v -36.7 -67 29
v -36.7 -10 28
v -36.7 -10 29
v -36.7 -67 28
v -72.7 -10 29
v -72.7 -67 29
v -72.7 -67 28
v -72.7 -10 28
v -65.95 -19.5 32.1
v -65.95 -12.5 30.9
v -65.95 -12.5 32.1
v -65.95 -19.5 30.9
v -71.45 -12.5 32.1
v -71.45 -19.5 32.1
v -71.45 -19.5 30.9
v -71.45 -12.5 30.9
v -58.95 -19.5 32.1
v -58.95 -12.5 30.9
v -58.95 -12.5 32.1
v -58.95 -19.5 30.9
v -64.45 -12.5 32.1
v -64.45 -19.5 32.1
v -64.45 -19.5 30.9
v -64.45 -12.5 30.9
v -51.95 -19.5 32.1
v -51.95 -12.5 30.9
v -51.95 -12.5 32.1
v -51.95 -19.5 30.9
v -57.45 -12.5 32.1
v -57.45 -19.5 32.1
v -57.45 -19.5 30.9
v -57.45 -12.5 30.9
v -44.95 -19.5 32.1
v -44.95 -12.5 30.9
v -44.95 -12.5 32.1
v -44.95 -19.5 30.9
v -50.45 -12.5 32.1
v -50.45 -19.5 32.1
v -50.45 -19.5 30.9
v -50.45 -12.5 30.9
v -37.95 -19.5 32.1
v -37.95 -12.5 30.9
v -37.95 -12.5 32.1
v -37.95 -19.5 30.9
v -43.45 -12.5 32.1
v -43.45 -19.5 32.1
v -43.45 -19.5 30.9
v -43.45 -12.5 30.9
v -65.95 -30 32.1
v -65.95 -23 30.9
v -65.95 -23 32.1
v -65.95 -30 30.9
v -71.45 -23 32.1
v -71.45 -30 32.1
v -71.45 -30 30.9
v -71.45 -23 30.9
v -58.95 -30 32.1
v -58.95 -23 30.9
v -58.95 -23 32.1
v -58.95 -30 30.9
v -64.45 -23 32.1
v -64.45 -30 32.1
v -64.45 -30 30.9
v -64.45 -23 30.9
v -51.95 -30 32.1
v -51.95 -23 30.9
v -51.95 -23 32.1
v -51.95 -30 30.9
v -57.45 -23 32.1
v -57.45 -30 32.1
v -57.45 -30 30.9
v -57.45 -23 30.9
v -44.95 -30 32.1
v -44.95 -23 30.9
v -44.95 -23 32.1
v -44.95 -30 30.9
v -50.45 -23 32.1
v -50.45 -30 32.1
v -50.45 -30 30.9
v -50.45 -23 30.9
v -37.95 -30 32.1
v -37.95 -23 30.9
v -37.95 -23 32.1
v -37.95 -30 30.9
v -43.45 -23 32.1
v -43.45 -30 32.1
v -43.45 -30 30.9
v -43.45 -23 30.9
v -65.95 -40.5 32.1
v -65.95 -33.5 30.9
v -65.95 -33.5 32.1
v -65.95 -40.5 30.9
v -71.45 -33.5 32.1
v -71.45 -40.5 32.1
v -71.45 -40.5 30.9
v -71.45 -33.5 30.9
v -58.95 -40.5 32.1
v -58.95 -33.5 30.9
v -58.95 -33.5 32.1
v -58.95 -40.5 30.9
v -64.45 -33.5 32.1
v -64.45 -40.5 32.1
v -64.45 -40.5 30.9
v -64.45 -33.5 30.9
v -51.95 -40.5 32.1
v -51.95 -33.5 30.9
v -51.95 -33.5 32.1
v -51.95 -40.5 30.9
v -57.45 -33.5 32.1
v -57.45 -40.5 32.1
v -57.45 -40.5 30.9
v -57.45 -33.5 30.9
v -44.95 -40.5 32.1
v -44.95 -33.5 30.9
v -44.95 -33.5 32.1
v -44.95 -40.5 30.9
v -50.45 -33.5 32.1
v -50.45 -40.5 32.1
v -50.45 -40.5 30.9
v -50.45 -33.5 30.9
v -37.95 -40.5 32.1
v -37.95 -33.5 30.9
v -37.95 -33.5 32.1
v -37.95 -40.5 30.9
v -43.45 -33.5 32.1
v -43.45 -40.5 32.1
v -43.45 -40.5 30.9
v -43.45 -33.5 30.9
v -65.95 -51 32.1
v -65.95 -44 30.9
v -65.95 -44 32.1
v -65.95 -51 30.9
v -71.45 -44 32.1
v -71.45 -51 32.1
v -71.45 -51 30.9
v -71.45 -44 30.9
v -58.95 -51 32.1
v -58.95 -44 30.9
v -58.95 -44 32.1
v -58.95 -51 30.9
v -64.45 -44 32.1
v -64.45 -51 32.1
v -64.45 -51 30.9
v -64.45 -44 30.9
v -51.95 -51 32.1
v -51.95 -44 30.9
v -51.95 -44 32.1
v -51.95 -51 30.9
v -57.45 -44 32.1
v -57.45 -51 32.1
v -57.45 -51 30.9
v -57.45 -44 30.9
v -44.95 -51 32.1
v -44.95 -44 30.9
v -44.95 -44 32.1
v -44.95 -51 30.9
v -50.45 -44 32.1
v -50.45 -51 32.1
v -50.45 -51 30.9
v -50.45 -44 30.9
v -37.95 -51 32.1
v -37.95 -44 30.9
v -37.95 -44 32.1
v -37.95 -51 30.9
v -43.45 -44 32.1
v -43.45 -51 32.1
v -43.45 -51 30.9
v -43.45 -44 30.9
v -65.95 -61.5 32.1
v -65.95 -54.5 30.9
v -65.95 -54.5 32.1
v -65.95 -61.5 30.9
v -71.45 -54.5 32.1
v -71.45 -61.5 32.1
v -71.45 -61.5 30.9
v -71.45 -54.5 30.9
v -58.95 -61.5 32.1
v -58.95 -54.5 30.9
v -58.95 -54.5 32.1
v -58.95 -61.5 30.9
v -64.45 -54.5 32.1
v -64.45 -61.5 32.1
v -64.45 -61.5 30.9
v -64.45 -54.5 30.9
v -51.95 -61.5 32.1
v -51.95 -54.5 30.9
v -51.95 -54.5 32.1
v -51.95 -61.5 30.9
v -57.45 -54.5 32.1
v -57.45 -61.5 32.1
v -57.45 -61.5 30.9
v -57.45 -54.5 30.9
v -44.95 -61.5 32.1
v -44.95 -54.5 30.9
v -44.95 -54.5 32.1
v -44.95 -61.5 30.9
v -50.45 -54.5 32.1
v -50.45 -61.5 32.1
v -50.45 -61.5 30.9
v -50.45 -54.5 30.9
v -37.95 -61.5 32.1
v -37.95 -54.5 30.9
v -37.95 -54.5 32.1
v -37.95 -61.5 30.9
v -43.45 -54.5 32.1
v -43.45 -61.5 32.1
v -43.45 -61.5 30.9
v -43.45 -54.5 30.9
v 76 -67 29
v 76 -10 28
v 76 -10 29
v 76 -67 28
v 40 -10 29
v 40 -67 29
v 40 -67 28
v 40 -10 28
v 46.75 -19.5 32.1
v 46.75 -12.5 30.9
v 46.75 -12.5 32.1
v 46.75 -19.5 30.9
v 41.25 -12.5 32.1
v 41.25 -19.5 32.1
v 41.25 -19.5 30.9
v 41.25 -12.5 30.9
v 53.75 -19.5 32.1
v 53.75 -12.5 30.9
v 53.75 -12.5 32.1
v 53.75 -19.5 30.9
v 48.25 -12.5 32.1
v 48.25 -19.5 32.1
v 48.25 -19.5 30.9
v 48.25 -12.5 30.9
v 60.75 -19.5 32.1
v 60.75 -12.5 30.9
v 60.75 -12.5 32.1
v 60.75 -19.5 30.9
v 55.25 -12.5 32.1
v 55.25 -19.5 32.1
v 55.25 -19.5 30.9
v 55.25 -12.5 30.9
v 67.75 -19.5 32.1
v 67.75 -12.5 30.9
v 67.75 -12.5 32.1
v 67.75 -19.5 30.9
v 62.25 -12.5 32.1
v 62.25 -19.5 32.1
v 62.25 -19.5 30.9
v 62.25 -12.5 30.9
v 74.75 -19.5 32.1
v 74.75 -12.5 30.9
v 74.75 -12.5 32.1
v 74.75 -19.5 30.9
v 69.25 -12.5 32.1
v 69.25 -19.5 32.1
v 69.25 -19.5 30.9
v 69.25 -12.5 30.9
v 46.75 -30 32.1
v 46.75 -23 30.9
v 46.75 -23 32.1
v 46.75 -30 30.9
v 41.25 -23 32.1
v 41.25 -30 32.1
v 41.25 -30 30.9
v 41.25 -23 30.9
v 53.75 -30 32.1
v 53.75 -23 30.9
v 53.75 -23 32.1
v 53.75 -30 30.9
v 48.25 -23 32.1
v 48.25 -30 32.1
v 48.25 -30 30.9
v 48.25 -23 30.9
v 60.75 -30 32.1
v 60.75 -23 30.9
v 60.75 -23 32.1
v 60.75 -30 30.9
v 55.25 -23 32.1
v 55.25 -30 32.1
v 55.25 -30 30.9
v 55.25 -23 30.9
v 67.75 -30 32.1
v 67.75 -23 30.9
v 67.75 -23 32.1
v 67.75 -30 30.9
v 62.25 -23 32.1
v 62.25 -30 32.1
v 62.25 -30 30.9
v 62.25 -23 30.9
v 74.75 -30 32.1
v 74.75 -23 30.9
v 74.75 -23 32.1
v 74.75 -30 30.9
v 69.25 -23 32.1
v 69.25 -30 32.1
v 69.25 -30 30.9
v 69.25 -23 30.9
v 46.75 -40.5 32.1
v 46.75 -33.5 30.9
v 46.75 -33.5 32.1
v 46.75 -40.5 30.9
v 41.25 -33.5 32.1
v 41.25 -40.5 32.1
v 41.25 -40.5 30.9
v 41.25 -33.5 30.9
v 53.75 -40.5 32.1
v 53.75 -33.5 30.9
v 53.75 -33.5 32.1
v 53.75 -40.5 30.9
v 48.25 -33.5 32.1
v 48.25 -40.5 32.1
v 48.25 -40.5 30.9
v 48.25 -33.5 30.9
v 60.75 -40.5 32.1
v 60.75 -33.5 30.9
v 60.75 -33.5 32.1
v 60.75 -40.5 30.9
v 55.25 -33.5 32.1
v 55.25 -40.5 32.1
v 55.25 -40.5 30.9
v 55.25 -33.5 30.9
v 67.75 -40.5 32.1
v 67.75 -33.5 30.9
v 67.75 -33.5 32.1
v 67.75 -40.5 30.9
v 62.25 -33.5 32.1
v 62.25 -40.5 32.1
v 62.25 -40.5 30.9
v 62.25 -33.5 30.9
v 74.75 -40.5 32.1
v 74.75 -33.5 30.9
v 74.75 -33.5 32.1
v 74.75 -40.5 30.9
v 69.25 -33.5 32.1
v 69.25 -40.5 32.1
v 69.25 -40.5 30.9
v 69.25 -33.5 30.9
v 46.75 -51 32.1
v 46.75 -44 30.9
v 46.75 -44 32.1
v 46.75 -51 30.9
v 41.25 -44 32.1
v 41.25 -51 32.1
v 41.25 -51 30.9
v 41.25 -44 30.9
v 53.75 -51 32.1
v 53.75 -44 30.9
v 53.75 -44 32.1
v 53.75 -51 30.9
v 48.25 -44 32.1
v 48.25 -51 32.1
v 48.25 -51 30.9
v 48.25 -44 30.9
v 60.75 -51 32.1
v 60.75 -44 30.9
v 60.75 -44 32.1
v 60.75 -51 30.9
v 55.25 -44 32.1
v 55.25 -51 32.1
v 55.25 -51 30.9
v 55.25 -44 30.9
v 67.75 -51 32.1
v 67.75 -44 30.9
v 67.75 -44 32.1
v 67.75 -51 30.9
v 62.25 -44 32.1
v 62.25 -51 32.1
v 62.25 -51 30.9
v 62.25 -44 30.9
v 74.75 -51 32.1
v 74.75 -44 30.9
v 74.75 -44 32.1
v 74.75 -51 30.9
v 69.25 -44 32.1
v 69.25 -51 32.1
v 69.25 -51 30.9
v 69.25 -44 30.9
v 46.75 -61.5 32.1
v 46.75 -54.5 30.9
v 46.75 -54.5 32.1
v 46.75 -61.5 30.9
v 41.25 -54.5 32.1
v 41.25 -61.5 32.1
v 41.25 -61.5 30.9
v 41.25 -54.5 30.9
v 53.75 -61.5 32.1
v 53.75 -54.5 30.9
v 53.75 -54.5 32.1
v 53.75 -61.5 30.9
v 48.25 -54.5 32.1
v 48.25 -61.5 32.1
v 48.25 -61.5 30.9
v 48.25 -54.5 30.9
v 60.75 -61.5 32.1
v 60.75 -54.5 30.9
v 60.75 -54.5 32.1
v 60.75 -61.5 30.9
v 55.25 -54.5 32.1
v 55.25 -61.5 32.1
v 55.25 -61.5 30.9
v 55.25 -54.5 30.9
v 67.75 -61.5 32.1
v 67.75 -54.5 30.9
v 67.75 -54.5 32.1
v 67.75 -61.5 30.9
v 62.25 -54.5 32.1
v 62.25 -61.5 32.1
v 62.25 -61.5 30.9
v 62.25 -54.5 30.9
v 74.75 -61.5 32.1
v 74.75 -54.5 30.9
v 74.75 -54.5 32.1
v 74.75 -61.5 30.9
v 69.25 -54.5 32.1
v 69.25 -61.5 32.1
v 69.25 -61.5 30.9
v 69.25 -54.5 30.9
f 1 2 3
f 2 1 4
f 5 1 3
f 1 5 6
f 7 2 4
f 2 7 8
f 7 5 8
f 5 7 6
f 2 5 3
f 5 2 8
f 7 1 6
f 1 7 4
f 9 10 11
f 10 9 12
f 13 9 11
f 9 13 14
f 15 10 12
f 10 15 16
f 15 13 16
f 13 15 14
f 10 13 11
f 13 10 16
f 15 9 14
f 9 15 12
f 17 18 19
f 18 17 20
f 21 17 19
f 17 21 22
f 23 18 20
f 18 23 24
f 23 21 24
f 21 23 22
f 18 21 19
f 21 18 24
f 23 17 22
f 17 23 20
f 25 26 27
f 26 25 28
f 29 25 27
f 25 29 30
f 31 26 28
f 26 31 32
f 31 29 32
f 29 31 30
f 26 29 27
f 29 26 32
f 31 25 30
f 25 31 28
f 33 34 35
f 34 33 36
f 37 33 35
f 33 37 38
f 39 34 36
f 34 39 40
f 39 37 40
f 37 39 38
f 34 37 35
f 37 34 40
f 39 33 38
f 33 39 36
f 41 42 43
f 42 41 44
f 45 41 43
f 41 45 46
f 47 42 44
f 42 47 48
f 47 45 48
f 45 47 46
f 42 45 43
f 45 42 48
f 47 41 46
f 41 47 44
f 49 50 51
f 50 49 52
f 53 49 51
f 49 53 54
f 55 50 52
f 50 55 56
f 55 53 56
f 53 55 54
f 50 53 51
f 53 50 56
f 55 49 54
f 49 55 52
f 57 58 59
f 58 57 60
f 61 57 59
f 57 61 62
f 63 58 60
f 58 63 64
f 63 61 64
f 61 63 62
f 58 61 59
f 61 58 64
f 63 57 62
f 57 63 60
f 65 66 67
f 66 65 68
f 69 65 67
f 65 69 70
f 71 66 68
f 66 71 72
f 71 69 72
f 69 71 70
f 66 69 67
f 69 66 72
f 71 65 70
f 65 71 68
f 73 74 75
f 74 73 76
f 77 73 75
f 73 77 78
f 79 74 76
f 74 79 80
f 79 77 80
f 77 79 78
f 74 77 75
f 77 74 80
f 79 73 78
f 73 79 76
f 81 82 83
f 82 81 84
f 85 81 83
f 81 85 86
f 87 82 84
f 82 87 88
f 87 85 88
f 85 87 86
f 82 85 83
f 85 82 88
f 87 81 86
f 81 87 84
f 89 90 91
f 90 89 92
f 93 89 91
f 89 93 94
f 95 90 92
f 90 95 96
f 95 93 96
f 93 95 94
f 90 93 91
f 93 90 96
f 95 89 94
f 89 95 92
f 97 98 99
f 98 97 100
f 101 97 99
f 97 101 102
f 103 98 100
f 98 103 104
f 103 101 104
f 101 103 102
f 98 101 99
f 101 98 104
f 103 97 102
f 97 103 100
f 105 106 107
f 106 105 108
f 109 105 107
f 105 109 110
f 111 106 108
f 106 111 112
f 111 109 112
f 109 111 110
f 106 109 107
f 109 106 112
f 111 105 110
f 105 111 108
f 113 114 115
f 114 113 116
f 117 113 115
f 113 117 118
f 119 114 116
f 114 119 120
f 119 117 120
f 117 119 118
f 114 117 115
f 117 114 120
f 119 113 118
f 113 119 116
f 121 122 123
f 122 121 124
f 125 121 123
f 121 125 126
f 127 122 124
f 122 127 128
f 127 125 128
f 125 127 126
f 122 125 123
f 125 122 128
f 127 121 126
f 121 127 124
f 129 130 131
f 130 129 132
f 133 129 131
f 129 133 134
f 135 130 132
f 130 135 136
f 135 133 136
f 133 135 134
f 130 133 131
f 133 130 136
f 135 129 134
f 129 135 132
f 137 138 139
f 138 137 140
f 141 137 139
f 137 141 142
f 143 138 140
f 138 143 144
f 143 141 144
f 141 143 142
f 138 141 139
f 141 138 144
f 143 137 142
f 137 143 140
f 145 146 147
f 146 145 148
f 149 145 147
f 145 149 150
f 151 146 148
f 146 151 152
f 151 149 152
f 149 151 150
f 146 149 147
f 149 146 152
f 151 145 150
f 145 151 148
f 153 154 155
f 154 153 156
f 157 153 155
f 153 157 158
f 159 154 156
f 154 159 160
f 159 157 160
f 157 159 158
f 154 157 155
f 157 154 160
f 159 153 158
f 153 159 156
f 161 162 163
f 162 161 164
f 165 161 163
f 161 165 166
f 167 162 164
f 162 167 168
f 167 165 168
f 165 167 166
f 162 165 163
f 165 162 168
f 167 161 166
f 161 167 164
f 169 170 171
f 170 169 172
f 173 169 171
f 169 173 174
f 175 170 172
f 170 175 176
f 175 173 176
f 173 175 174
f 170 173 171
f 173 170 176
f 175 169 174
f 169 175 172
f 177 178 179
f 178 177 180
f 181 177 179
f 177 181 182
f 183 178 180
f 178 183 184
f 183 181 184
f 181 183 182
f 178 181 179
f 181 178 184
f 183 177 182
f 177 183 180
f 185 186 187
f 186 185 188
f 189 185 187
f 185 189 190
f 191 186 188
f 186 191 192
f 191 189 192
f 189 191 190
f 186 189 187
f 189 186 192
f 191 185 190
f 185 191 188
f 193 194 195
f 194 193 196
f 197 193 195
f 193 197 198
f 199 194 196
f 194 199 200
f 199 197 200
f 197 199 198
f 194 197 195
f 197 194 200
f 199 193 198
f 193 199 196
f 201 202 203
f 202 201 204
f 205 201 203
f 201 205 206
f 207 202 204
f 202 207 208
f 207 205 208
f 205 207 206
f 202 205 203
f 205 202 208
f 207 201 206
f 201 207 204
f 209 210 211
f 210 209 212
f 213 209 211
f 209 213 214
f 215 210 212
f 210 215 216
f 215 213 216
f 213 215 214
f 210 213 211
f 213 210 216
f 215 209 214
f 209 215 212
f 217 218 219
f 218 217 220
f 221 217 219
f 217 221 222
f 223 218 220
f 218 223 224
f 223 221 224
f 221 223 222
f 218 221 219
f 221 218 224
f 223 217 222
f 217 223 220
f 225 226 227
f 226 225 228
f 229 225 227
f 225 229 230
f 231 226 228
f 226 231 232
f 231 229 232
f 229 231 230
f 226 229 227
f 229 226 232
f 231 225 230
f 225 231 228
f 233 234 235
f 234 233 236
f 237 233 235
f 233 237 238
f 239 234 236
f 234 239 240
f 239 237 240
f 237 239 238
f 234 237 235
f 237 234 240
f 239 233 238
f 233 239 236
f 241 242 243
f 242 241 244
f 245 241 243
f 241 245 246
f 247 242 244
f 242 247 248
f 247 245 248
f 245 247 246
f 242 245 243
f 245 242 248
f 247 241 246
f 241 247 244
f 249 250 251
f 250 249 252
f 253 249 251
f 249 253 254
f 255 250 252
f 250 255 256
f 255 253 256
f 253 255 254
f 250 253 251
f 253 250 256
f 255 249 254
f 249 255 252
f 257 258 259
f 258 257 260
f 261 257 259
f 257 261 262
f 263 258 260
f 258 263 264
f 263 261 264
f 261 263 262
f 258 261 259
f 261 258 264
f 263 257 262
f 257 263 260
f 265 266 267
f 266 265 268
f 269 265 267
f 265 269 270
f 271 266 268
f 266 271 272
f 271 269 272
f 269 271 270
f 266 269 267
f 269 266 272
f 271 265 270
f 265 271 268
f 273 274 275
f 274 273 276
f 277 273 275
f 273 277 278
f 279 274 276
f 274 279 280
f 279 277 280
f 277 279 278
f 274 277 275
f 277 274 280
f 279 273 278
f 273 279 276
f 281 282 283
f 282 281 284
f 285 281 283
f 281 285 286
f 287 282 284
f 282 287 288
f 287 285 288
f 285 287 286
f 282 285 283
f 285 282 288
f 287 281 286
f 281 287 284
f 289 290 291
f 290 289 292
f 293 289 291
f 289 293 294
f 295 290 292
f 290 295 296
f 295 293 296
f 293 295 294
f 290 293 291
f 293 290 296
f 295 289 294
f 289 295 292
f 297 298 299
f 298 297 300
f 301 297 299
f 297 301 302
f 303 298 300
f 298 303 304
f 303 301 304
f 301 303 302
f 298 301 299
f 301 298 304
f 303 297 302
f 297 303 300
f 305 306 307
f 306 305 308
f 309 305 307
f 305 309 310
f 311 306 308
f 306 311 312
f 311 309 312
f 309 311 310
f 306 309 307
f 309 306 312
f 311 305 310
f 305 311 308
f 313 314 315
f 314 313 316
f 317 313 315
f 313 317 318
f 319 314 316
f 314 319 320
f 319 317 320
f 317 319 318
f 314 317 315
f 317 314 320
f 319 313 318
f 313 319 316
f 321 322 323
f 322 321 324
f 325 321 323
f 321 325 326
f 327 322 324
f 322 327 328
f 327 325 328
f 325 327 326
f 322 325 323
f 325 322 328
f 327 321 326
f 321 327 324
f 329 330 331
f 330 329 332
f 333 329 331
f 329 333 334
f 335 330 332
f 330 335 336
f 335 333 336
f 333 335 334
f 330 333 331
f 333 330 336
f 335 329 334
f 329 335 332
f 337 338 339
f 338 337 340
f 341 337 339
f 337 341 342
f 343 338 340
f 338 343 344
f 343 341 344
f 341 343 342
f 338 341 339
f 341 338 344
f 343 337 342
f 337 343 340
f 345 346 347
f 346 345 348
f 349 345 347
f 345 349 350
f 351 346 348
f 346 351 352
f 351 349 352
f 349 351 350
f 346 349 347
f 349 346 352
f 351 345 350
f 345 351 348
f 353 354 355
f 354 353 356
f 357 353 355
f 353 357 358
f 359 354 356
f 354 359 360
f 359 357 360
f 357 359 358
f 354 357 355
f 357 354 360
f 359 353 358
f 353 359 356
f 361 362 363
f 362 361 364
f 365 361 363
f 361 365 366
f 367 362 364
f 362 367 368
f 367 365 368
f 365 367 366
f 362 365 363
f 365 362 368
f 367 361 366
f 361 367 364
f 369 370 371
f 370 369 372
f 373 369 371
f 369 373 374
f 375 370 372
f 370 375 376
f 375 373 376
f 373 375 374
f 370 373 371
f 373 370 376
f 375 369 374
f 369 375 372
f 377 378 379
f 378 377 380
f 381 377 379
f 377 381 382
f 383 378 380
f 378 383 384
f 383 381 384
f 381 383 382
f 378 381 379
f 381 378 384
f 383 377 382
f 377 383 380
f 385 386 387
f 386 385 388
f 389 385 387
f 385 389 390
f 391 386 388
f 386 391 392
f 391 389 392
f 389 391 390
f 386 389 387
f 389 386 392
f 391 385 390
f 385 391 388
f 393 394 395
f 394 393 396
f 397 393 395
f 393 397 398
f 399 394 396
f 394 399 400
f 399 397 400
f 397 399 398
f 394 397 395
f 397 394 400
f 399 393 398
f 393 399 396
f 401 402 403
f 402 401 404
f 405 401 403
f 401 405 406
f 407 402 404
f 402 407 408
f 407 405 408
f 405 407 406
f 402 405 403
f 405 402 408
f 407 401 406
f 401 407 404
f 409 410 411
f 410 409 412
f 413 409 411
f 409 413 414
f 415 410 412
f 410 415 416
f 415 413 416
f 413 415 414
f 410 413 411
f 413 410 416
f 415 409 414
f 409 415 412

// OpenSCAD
// Thor QWERTY retrofit conceptual solids, mm
// Source scan and exact inner housing *not* redistributed or certified.
// Two attachments are displayed OVER original control areas.
// This is not a cutting template or closed-lid clearance proof.
include_scan = false;
source_scan = "/tmp/hs-thor-open-reference-20261109.stl";
if (include_scan) color([0.55,0.55,0.58,0.4]) import(source_scan, convexity=3);
pcb_thickness = 1.0;  // exploratory, not KiCad stackup qualified
switch_height = 1.9; // C&K KMR2 spec over PCB
cap_extra_height = 1.2; // unverified cap geometry
module_z = 28.0; // placeholder: NOT qualified from internal scan
module_mounts_known = false;
module_lid_clearance_known = false;
// left: original controls should be removed, but mounts unproven
color([0.12,0.36,0.48,0.76]) translate([-72.7,-67.0,module_z]) cube([36.0,57.0,pcb_thickness]);
color([0.81,0.92,0.78]) translate([-71.450,-19.500,module_z+pcb_thickness+switch_height]) cube([5.5,7.0,cap_extra_height]); // Q
color([0.81,0.92,0.78]) translate([-64.450,-19.500,module_z+pcb_thickness+switch_height]) cube([5.5,7.0,cap_extra_height]); // W
color([0.81,0.92,0.78]) translate([-57.450,-19.500,module_z+pcb_thickness+switch_height]) cube([5.5,7.0,cap_extra_height]); // E
color([0.81,0.92,0.78]) translate([-50.450,-19.500,module_z+pcb_thickness+switch_height]) cube([5.5,7.0,cap_extra_height]); // R
color([0.81,0.92,0.78]) translate([-43.450,-19.500,module_z+pcb_thickness+switch_height]) cube([5.5,7.0,cap_extra_height]); // T
color([0.81,0.92,0.78]) translate([-71.450,-30.000,module_z+pcb_thickness+switch_height]) cube([5.5,7.0,cap_extra_height]); // A
color([0.81,0.92,0.78]) translate([-64.450,-30.000,module_z+pcb_thickness+switch_height]) cube([5.5,7.0,cap_extra_height]); // S
color([0.81,0.92,0.78]) translate([-57.450,-30.000,module_z+pcb_thickness+switch_height]) cube([5.5,7.0,cap_extra_height]); // D
color([0.81,0.92,0.78]) translate([-50.450,-30.000,module_z+pcb_thickness+switch_height]) cube([5.5,7.0,cap_extra_height]); // F
color([0.81,0.92,0.78]) translate([-43.450,-30.000,module_z+pcb_thickness+switch_height]) cube([5.5,7.0,cap_extra_height]); // G
color([0.81,0.92,0.78]) translate([-71.450,-40.500,module_z+pcb_thickness+switch_height]) cube([5.5,7.0,cap_extra_height]); // Z
color([0.81,0.92,0.78]) translate([-64.450,-40.500,module_z+pcb_thickness+switch_height]) cube([5.5,7.0,cap_extra_height]); // X
color([0.81,0.92,0.78]) translate([-57.450,-40.500,module_z+pcb_thickness+switch_height]) cube([5.5,7.0,cap_extra_height]); // C
color([0.81,0.92,0.78]) translate([-50.450,-40.500,module_z+pcb_thickness+switch_height]) cube([5.5,7.0,cap_extra_height]); // V
color([0.81,0.92,0.78]) translate([-43.450,-40.500,module_z+pcb_thickness+switch_height]) cube([5.5,7.0,cap_extra_height]); // B
color([0.81,0.92,0.78]) translate([-71.450,-51.000,module_z+pcb_thickness+switch_height]) cube([5.5,7.0,cap_extra_height]); // 1
color([0.81,0.92,0.78]) translate([-64.450,-51.000,module_z+pcb_thickness+switch_height]) cube([5.5,7.0,cap_extra_height]); // 2
color([0.81,0.92,0.78]) translate([-57.450,-51.000,module_z+pcb_thickness+switch_height]) cube([5.5,7.0,cap_extra_height]); // 3
color([0.81,0.92,0.78]) translate([-50.450,-51.000,module_z+pcb_thickness+switch_height]) cube([5.5,7.0,cap_extra_height]); // 4
color([0.81,0.92,0.78]) translate([-43.450,-51.000,module_z+pcb_thickness+switch_height]) cube([5.5,7.0,cap_extra_height]); // 5
color([0.81,0.92,0.78]) translate([-71.450,-61.500,module_z+pcb_thickness+switch_height]) cube([5.5,7.0,cap_extra_height]); // SHIFT
color([0.81,0.92,0.78]) translate([-64.450,-61.500,module_z+pcb_thickness+switch_height]) cube([5.5,7.0,cap_extra_height]); // CTRL
color([0.81,0.92,0.78]) translate([-57.450,-61.500,module_z+pcb_thickness+switch_height]) cube([5.5,7.0,cap_extra_height]); // ALT
color([0.81,0.92,0.78]) translate([-50.450,-61.500,module_z+pcb_thickness+switch_height]) cube([5.5,7.0,cap_extra_height]); // TAB
color([0.81,0.92,0.78]) translate([-43.450,-61.500,module_z+pcb_thickness+switch_height]) cube([5.5,7.0,cap_extra_height]); // FN
// right: original controls should be removed, but mounts unproven
color([0.12,0.36,0.48,0.76]) translate([40.0,-67.0,module_z]) cube([36.0,57.0,pcb_thickness]);
color([0.81,0.92,0.78]) translate([41.250,-19.500,module_z+pcb_thickness+switch_height]) cube([5.5,7.0,cap_extra_height]); // Y
color([0.81,0.92,0.78]) translate([48.250,-19.500,module_z+pcb_thickness+switch_height]) cube([5.5,7.0,cap_extra_height]); // U
color([0.81,0.92,0.78]) translate([55.250,-19.500,module_z+pcb_thickness+switch_height]) cube([5.5,7.0,cap_extra_height]); // I
color([0.81,0.92,0.78]) translate([62.250,-19.500,module_z+pcb_thickness+switch_height]) cube([5.5,7.0,cap_extra_height]); // O
color([0.81,0.92,0.78]) translate([69.250,-19.500,module_z+pcb_thickness+switch_height]) cube([5.5,7.0,cap_extra_height]); // P
color([0.81,0.92,0.78]) translate([41.250,-30.000,module_z+pcb_thickness+switch_height]) cube([5.5,7.0,cap_extra_height]); // H
color([0.81,0.92,0.78]) translate([48.250,-30.000,module_z+pcb_thickness+switch_height]) cube([5.5,7.0,cap_extra_height]); // J
color([0.81,0.92,0.78]) translate([55.250,-30.000,module_z+pcb_thickness+switch_height]) cube([5.5,7.0,cap_extra_height]); // K
color([0.81,0.92,0.78]) translate([62.250,-30.000,module_z+pcb_thickness+switch_height]) cube([5.5,7.0,cap_extra_height]); // L
color([0.81,0.92,0.78]) translate([69.250,-30.000,module_z+pcb_thickness+switch_height]) cube([5.5,7.0,cap_extra_height]); // ;
color([0.81,0.92,0.78]) translate([41.250,-40.500,module_z+pcb_thickness+switch_height]) cube([5.5,7.0,cap_extra_height]); // N
color([0.81,0.92,0.78]) translate([48.250,-40.500,module_z+pcb_thickness+switch_height]) cube([5.5,7.0,cap_extra_height]); // M
color([0.81,0.92,0.78]) translate([55.250,-40.500,module_z+pcb_thickness+switch_height]) cube([5.5,7.0,cap_extra_height]); // ,
color([0.81,0.92,0.78]) translate([62.250,-40.500,module_z+pcb_thickness+switch_height]) cube([5.5,7.0,cap_extra_height]); // .
color([0.81,0.92,0.78]) translate([69.250,-40.500,module_z+pcb_thickness+switch_height]) cube([5.5,7.0,cap_extra_height]); // /
color([0.81,0.92,0.78]) translate([41.250,-51.000,module_z+pcb_thickness+switch_height]) cube([5.5,7.0,cap_extra_height]); // 6
color([0.81,0.92,0.78]) translate([48.250,-51.000,module_z+pcb_thickness+switch_height]) cube([5.5,7.0,cap_extra_height]); // 7
color([0.81,0.92,0.78]) translate([55.250,-51.000,module_z+pcb_thickness+switch_height]) cube([5.5,7.0,cap_extra_height]); // 8
color([0.81,0.92,0.78]) translate([62.250,-51.000,module_z+pcb_thickness+switch_height]) cube([5.5,7.0,cap_extra_height]); // 9
color([0.81,0.92,0.78]) translate([69.250,-51.000,module_z+pcb_thickness+switch_height]) cube([5.5,7.0,cap_extra_height]); // 0
color([0.81,0.92,0.78]) translate([41.250,-61.500,module_z+pcb_thickness+switch_height]) cube([5.5,7.0,cap_extra_height]); // SYM
color([0.81,0.92,0.78]) translate([48.250,-61.500,module_z+pcb_thickness+switch_height]) cube([5.5,7.0,cap_extra_height]); // SPACE
color([0.81,0.92,0.78]) translate([55.250,-61.500,module_z+pcb_thickness+switch_height]) cube([5.5,7.0,cap_extra_height]); // ENTER
color([0.81,0.92,0.78]) translate([62.250,-61.500,module_z+pcb_thickness+switch_height]) cube([5.5,7.0,cap_extra_height]); // BSPC
color([0.81,0.92,0.78]) translate([69.250,-61.500,module_z+pcb_thickness+switch_height]) cube([5.5,7.0,cap_extra_height]); // ESC
